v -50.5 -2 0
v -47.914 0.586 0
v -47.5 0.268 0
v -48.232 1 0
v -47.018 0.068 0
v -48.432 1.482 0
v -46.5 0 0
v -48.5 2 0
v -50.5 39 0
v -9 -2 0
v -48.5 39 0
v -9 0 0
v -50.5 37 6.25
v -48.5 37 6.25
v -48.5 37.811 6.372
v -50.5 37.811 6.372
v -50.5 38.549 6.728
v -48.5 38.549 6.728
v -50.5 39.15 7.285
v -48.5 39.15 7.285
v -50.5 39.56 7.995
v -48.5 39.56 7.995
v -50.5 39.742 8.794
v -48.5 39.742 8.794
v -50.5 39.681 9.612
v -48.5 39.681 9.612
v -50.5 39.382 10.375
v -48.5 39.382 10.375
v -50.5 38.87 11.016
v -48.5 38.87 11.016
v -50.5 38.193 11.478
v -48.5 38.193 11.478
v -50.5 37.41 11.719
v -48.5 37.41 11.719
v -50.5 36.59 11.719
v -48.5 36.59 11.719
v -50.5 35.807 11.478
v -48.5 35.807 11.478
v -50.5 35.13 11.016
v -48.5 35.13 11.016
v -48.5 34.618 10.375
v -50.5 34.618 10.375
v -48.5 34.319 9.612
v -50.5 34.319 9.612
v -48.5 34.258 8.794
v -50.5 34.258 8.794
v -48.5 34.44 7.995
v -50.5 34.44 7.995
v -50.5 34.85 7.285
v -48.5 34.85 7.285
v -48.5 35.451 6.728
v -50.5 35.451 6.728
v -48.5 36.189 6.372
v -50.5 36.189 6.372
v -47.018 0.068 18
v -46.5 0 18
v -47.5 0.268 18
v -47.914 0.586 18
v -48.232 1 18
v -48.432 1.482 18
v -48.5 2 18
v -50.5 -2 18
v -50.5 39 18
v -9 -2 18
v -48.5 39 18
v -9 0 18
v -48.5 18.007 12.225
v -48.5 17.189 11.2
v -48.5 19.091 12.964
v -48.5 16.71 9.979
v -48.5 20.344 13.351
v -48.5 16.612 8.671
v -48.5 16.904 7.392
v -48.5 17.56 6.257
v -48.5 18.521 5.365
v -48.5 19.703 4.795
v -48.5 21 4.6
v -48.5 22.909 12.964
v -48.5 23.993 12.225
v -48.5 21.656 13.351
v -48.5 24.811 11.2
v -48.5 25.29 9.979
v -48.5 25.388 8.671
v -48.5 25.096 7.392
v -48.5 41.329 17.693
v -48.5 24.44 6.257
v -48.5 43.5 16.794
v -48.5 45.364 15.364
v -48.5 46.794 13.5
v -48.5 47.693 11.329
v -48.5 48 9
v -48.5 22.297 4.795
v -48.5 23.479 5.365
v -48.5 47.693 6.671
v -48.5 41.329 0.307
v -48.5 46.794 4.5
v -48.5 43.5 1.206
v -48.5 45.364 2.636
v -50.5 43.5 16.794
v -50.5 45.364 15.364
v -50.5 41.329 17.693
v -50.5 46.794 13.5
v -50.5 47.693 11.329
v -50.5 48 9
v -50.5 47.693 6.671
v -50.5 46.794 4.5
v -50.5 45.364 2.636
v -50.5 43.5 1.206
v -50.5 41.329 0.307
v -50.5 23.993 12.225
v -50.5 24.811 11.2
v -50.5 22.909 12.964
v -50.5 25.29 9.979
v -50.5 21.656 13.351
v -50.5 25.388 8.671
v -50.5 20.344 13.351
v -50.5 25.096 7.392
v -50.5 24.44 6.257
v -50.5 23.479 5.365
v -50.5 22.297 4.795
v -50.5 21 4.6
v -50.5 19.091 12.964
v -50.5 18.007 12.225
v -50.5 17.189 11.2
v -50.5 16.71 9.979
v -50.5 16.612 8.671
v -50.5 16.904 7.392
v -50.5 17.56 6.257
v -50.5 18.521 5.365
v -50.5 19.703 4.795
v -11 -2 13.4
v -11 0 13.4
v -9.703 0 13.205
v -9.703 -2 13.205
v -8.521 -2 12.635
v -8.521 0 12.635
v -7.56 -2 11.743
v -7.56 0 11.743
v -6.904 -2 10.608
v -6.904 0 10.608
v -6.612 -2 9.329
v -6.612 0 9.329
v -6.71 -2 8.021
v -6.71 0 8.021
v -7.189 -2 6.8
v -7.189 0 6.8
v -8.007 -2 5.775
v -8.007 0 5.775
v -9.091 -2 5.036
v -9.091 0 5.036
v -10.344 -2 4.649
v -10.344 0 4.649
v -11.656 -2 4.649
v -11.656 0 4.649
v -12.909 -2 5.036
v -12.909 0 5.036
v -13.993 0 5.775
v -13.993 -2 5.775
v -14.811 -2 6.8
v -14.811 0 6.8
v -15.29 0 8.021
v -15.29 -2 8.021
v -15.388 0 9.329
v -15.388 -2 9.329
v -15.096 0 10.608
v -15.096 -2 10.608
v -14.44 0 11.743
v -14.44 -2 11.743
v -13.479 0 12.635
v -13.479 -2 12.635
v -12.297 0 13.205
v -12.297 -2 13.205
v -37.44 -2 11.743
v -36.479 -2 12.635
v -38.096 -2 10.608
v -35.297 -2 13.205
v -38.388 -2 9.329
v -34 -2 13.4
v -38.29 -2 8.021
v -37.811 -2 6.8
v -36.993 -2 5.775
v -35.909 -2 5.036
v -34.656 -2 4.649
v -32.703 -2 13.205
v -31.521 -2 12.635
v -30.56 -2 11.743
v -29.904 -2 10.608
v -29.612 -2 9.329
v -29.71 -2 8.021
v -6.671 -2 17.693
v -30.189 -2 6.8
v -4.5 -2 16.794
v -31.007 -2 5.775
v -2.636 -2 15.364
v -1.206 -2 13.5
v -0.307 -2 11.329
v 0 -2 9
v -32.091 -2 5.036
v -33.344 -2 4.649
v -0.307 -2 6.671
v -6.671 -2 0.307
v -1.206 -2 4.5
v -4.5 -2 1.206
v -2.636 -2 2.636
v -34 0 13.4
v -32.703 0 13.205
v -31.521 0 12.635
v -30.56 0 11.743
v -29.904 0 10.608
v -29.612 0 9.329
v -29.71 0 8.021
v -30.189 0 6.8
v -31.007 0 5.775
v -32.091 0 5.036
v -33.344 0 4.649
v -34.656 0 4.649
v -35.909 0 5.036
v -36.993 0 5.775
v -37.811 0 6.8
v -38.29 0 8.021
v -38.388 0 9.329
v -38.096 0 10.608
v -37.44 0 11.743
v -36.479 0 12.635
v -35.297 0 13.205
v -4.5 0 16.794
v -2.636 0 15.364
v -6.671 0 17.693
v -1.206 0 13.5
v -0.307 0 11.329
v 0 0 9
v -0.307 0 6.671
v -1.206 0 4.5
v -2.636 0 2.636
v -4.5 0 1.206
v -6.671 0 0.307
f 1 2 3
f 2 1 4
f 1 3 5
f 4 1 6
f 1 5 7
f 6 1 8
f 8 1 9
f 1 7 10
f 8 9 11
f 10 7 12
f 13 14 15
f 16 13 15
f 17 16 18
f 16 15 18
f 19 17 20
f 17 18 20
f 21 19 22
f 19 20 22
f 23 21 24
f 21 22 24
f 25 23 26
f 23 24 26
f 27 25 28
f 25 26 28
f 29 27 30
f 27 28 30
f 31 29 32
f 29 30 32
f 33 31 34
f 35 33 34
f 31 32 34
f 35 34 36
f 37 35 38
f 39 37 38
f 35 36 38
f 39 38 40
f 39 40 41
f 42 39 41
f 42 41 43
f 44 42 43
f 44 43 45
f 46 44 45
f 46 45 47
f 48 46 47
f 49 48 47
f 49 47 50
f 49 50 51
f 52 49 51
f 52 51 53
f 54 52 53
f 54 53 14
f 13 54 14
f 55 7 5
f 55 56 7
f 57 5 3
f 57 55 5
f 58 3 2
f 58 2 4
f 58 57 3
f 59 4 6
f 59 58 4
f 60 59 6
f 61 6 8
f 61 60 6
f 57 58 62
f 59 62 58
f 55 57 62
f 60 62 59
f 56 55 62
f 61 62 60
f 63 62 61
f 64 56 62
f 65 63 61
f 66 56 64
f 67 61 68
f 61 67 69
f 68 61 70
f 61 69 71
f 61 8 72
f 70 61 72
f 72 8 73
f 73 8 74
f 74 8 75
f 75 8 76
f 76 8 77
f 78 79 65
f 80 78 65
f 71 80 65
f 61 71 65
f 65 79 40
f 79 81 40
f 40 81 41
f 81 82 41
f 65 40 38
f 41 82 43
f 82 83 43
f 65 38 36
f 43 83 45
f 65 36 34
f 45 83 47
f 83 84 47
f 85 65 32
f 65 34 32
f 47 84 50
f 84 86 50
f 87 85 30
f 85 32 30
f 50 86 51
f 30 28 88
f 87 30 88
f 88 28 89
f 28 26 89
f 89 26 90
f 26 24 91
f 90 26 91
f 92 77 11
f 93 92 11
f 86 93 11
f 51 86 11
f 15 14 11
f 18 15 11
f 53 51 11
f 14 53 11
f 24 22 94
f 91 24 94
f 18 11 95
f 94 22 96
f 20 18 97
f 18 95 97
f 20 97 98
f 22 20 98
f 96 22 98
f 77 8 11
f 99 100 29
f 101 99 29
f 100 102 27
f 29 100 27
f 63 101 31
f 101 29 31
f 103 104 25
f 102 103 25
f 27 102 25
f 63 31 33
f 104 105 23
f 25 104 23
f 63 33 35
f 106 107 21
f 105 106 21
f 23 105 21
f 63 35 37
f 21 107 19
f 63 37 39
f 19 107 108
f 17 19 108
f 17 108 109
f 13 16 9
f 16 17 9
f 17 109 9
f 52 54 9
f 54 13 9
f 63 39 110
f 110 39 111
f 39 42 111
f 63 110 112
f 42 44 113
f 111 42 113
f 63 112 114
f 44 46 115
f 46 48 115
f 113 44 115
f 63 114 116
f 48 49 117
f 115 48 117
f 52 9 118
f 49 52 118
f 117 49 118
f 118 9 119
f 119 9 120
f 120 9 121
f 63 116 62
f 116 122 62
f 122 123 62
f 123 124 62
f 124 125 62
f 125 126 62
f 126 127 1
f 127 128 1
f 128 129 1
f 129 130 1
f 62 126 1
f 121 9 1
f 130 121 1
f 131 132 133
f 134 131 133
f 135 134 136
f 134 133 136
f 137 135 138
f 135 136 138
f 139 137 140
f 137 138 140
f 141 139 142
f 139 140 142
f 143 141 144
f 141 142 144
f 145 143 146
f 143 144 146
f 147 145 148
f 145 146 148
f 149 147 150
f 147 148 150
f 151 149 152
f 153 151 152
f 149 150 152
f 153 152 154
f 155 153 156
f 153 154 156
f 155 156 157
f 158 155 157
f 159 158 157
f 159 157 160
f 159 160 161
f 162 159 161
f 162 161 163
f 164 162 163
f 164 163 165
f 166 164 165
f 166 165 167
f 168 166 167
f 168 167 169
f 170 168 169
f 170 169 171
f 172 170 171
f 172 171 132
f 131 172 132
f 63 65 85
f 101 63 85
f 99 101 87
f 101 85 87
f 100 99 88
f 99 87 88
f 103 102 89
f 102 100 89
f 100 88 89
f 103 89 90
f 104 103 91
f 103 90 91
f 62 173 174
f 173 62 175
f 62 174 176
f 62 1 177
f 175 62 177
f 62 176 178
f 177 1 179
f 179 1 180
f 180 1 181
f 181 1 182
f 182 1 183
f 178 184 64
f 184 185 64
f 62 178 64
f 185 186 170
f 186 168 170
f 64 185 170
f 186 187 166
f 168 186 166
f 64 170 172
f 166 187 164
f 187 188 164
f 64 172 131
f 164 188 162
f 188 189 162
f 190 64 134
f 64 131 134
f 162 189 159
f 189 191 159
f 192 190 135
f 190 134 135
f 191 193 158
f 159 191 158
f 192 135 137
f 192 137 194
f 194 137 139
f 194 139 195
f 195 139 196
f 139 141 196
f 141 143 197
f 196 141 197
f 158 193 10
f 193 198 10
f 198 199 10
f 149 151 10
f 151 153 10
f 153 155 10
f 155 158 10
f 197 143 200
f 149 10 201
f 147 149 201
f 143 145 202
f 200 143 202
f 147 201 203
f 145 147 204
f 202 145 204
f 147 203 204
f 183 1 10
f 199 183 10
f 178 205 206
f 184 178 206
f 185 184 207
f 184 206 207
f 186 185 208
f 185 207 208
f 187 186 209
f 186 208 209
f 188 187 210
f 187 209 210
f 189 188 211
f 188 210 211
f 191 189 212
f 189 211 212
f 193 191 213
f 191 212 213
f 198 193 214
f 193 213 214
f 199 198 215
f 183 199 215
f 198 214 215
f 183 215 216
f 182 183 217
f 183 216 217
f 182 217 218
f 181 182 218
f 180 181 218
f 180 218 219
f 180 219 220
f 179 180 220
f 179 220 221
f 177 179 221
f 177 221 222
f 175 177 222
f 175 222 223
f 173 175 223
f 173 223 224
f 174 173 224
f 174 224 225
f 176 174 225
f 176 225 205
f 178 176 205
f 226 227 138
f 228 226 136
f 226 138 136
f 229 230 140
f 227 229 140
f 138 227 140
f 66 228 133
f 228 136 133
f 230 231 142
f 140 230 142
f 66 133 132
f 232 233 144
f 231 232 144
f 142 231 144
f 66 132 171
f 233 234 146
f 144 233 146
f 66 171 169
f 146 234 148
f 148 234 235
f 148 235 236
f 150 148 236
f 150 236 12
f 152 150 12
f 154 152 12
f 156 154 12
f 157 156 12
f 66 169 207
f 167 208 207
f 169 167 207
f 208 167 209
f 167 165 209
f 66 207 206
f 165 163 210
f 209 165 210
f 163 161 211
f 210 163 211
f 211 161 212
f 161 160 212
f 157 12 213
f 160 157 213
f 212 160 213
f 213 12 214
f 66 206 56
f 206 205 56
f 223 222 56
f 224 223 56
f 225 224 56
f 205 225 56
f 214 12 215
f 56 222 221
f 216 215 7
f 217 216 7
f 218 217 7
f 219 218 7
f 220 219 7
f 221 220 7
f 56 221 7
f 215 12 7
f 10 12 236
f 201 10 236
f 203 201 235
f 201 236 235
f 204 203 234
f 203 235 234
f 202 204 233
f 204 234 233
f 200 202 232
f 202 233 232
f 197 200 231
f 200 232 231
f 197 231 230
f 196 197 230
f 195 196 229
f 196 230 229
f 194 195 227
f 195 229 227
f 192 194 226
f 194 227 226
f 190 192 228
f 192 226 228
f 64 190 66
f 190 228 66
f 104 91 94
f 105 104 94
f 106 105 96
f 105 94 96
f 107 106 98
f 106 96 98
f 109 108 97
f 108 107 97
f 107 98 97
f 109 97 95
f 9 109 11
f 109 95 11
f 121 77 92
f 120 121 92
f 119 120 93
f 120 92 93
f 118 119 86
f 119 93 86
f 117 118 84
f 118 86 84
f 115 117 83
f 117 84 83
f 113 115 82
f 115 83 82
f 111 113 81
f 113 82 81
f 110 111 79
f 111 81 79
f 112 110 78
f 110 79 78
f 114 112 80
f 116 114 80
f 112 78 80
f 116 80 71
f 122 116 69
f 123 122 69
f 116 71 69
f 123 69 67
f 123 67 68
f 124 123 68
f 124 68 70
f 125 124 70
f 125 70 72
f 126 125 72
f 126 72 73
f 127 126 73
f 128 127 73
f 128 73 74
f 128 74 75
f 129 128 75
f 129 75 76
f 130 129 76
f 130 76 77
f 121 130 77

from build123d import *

# Parameters (mm, degrees)
EXTRUDE_1_DEPTH     = 18
FILLET_1_R          = 2
SKETCH_2_R          = 4.4
SKETCH_2_R_2        = 2.75
CUT_EXTRUDE_1_DEPTH = 10
SKETCH_3_R          = 4.4
CUT_EXTRUDE_2_DEPTH = 10


with BuildPart() as part:
    # 草图1 → 凸台-拉伸1 (new body)
    with BuildSketch(Plane.XY):
        Polygon((0, 0), (-48.5, 0), (-48.5, 48), (-50.5, 48), (-50.5, -2), (0, -2), align=None)
    extrude(amount=EXTRUDE_1_DEPTH)

    # 圆角1
    fillet_1_edges = [part.edges().sort_by_distance(p)[0] for p in [
        (-48.5, 0, 9),
    ]]
    fillet(fillet_1_edges, radius=FILLET_1_R)

    # 草图2 → 切除-拉伸1 (cut)
    with BuildSketch(Plane(origin=(-48.5, 0, 0), x_dir=(0, 0, -1), z_dir=(1, 0, 0))):
        with BuildLine():
            Line((-9, 48), (-18, 48))
            Line((-18, 48), (-18, 39))
            ThreePointArc((-18, 39), (-15.363961031, 45.363961031), (-9, 48))
        make_face()
        with Locations((-9, 21)):
            Circle(SKETCH_2_R)
        with Locations((-9, 37)):
            Circle(SKETCH_2_R_2)
        with BuildLine():
            Line((0, 48), (-9, 48))
            ThreePointArc((-9, 48), (-2.636038969, 45.363961031), (0, 39))
            Line((0, 39), (0, 48))
        make_face()
    extrude(amount=-CUT_EXTRUDE_1_DEPTH, mode=Mode.SUBTRACT)

    # 草图3 → 切除-拉伸2 (cut)
    with BuildSketch(Plane(origin=(0, 0, 0), x_dir=(1, 0, 0), z_dir=(0, 1, 0))):
        with BuildLine():
            Line((0, -9), (0, 0))
            Line((0, 0), (-9, 0))
            ThreePointArc((-9, 0), (-2.636038969, -2.636038969), (0, -9))
        make_face()
        with Locations(Location((-34, -9, 0), (0, 0, 270))):
            Circle(SKETCH_3_R)
        with Locations(Location((-11, -9, 0), (0, 0, 270))):
            Circle(SKETCH_3_R)
        with BuildLine():
            Line((0, -18), (0, -9))
            ThreePointArc((0, -9), (-2.636038969, -15.363961031), (-9, -18))
            Line((-9, -18), (0, -18))
        make_face()
    extrude(amount=-CUT_EXTRUDE_2_DEPTH, mode=Mode.SUBTRACT)


solid = part.part
